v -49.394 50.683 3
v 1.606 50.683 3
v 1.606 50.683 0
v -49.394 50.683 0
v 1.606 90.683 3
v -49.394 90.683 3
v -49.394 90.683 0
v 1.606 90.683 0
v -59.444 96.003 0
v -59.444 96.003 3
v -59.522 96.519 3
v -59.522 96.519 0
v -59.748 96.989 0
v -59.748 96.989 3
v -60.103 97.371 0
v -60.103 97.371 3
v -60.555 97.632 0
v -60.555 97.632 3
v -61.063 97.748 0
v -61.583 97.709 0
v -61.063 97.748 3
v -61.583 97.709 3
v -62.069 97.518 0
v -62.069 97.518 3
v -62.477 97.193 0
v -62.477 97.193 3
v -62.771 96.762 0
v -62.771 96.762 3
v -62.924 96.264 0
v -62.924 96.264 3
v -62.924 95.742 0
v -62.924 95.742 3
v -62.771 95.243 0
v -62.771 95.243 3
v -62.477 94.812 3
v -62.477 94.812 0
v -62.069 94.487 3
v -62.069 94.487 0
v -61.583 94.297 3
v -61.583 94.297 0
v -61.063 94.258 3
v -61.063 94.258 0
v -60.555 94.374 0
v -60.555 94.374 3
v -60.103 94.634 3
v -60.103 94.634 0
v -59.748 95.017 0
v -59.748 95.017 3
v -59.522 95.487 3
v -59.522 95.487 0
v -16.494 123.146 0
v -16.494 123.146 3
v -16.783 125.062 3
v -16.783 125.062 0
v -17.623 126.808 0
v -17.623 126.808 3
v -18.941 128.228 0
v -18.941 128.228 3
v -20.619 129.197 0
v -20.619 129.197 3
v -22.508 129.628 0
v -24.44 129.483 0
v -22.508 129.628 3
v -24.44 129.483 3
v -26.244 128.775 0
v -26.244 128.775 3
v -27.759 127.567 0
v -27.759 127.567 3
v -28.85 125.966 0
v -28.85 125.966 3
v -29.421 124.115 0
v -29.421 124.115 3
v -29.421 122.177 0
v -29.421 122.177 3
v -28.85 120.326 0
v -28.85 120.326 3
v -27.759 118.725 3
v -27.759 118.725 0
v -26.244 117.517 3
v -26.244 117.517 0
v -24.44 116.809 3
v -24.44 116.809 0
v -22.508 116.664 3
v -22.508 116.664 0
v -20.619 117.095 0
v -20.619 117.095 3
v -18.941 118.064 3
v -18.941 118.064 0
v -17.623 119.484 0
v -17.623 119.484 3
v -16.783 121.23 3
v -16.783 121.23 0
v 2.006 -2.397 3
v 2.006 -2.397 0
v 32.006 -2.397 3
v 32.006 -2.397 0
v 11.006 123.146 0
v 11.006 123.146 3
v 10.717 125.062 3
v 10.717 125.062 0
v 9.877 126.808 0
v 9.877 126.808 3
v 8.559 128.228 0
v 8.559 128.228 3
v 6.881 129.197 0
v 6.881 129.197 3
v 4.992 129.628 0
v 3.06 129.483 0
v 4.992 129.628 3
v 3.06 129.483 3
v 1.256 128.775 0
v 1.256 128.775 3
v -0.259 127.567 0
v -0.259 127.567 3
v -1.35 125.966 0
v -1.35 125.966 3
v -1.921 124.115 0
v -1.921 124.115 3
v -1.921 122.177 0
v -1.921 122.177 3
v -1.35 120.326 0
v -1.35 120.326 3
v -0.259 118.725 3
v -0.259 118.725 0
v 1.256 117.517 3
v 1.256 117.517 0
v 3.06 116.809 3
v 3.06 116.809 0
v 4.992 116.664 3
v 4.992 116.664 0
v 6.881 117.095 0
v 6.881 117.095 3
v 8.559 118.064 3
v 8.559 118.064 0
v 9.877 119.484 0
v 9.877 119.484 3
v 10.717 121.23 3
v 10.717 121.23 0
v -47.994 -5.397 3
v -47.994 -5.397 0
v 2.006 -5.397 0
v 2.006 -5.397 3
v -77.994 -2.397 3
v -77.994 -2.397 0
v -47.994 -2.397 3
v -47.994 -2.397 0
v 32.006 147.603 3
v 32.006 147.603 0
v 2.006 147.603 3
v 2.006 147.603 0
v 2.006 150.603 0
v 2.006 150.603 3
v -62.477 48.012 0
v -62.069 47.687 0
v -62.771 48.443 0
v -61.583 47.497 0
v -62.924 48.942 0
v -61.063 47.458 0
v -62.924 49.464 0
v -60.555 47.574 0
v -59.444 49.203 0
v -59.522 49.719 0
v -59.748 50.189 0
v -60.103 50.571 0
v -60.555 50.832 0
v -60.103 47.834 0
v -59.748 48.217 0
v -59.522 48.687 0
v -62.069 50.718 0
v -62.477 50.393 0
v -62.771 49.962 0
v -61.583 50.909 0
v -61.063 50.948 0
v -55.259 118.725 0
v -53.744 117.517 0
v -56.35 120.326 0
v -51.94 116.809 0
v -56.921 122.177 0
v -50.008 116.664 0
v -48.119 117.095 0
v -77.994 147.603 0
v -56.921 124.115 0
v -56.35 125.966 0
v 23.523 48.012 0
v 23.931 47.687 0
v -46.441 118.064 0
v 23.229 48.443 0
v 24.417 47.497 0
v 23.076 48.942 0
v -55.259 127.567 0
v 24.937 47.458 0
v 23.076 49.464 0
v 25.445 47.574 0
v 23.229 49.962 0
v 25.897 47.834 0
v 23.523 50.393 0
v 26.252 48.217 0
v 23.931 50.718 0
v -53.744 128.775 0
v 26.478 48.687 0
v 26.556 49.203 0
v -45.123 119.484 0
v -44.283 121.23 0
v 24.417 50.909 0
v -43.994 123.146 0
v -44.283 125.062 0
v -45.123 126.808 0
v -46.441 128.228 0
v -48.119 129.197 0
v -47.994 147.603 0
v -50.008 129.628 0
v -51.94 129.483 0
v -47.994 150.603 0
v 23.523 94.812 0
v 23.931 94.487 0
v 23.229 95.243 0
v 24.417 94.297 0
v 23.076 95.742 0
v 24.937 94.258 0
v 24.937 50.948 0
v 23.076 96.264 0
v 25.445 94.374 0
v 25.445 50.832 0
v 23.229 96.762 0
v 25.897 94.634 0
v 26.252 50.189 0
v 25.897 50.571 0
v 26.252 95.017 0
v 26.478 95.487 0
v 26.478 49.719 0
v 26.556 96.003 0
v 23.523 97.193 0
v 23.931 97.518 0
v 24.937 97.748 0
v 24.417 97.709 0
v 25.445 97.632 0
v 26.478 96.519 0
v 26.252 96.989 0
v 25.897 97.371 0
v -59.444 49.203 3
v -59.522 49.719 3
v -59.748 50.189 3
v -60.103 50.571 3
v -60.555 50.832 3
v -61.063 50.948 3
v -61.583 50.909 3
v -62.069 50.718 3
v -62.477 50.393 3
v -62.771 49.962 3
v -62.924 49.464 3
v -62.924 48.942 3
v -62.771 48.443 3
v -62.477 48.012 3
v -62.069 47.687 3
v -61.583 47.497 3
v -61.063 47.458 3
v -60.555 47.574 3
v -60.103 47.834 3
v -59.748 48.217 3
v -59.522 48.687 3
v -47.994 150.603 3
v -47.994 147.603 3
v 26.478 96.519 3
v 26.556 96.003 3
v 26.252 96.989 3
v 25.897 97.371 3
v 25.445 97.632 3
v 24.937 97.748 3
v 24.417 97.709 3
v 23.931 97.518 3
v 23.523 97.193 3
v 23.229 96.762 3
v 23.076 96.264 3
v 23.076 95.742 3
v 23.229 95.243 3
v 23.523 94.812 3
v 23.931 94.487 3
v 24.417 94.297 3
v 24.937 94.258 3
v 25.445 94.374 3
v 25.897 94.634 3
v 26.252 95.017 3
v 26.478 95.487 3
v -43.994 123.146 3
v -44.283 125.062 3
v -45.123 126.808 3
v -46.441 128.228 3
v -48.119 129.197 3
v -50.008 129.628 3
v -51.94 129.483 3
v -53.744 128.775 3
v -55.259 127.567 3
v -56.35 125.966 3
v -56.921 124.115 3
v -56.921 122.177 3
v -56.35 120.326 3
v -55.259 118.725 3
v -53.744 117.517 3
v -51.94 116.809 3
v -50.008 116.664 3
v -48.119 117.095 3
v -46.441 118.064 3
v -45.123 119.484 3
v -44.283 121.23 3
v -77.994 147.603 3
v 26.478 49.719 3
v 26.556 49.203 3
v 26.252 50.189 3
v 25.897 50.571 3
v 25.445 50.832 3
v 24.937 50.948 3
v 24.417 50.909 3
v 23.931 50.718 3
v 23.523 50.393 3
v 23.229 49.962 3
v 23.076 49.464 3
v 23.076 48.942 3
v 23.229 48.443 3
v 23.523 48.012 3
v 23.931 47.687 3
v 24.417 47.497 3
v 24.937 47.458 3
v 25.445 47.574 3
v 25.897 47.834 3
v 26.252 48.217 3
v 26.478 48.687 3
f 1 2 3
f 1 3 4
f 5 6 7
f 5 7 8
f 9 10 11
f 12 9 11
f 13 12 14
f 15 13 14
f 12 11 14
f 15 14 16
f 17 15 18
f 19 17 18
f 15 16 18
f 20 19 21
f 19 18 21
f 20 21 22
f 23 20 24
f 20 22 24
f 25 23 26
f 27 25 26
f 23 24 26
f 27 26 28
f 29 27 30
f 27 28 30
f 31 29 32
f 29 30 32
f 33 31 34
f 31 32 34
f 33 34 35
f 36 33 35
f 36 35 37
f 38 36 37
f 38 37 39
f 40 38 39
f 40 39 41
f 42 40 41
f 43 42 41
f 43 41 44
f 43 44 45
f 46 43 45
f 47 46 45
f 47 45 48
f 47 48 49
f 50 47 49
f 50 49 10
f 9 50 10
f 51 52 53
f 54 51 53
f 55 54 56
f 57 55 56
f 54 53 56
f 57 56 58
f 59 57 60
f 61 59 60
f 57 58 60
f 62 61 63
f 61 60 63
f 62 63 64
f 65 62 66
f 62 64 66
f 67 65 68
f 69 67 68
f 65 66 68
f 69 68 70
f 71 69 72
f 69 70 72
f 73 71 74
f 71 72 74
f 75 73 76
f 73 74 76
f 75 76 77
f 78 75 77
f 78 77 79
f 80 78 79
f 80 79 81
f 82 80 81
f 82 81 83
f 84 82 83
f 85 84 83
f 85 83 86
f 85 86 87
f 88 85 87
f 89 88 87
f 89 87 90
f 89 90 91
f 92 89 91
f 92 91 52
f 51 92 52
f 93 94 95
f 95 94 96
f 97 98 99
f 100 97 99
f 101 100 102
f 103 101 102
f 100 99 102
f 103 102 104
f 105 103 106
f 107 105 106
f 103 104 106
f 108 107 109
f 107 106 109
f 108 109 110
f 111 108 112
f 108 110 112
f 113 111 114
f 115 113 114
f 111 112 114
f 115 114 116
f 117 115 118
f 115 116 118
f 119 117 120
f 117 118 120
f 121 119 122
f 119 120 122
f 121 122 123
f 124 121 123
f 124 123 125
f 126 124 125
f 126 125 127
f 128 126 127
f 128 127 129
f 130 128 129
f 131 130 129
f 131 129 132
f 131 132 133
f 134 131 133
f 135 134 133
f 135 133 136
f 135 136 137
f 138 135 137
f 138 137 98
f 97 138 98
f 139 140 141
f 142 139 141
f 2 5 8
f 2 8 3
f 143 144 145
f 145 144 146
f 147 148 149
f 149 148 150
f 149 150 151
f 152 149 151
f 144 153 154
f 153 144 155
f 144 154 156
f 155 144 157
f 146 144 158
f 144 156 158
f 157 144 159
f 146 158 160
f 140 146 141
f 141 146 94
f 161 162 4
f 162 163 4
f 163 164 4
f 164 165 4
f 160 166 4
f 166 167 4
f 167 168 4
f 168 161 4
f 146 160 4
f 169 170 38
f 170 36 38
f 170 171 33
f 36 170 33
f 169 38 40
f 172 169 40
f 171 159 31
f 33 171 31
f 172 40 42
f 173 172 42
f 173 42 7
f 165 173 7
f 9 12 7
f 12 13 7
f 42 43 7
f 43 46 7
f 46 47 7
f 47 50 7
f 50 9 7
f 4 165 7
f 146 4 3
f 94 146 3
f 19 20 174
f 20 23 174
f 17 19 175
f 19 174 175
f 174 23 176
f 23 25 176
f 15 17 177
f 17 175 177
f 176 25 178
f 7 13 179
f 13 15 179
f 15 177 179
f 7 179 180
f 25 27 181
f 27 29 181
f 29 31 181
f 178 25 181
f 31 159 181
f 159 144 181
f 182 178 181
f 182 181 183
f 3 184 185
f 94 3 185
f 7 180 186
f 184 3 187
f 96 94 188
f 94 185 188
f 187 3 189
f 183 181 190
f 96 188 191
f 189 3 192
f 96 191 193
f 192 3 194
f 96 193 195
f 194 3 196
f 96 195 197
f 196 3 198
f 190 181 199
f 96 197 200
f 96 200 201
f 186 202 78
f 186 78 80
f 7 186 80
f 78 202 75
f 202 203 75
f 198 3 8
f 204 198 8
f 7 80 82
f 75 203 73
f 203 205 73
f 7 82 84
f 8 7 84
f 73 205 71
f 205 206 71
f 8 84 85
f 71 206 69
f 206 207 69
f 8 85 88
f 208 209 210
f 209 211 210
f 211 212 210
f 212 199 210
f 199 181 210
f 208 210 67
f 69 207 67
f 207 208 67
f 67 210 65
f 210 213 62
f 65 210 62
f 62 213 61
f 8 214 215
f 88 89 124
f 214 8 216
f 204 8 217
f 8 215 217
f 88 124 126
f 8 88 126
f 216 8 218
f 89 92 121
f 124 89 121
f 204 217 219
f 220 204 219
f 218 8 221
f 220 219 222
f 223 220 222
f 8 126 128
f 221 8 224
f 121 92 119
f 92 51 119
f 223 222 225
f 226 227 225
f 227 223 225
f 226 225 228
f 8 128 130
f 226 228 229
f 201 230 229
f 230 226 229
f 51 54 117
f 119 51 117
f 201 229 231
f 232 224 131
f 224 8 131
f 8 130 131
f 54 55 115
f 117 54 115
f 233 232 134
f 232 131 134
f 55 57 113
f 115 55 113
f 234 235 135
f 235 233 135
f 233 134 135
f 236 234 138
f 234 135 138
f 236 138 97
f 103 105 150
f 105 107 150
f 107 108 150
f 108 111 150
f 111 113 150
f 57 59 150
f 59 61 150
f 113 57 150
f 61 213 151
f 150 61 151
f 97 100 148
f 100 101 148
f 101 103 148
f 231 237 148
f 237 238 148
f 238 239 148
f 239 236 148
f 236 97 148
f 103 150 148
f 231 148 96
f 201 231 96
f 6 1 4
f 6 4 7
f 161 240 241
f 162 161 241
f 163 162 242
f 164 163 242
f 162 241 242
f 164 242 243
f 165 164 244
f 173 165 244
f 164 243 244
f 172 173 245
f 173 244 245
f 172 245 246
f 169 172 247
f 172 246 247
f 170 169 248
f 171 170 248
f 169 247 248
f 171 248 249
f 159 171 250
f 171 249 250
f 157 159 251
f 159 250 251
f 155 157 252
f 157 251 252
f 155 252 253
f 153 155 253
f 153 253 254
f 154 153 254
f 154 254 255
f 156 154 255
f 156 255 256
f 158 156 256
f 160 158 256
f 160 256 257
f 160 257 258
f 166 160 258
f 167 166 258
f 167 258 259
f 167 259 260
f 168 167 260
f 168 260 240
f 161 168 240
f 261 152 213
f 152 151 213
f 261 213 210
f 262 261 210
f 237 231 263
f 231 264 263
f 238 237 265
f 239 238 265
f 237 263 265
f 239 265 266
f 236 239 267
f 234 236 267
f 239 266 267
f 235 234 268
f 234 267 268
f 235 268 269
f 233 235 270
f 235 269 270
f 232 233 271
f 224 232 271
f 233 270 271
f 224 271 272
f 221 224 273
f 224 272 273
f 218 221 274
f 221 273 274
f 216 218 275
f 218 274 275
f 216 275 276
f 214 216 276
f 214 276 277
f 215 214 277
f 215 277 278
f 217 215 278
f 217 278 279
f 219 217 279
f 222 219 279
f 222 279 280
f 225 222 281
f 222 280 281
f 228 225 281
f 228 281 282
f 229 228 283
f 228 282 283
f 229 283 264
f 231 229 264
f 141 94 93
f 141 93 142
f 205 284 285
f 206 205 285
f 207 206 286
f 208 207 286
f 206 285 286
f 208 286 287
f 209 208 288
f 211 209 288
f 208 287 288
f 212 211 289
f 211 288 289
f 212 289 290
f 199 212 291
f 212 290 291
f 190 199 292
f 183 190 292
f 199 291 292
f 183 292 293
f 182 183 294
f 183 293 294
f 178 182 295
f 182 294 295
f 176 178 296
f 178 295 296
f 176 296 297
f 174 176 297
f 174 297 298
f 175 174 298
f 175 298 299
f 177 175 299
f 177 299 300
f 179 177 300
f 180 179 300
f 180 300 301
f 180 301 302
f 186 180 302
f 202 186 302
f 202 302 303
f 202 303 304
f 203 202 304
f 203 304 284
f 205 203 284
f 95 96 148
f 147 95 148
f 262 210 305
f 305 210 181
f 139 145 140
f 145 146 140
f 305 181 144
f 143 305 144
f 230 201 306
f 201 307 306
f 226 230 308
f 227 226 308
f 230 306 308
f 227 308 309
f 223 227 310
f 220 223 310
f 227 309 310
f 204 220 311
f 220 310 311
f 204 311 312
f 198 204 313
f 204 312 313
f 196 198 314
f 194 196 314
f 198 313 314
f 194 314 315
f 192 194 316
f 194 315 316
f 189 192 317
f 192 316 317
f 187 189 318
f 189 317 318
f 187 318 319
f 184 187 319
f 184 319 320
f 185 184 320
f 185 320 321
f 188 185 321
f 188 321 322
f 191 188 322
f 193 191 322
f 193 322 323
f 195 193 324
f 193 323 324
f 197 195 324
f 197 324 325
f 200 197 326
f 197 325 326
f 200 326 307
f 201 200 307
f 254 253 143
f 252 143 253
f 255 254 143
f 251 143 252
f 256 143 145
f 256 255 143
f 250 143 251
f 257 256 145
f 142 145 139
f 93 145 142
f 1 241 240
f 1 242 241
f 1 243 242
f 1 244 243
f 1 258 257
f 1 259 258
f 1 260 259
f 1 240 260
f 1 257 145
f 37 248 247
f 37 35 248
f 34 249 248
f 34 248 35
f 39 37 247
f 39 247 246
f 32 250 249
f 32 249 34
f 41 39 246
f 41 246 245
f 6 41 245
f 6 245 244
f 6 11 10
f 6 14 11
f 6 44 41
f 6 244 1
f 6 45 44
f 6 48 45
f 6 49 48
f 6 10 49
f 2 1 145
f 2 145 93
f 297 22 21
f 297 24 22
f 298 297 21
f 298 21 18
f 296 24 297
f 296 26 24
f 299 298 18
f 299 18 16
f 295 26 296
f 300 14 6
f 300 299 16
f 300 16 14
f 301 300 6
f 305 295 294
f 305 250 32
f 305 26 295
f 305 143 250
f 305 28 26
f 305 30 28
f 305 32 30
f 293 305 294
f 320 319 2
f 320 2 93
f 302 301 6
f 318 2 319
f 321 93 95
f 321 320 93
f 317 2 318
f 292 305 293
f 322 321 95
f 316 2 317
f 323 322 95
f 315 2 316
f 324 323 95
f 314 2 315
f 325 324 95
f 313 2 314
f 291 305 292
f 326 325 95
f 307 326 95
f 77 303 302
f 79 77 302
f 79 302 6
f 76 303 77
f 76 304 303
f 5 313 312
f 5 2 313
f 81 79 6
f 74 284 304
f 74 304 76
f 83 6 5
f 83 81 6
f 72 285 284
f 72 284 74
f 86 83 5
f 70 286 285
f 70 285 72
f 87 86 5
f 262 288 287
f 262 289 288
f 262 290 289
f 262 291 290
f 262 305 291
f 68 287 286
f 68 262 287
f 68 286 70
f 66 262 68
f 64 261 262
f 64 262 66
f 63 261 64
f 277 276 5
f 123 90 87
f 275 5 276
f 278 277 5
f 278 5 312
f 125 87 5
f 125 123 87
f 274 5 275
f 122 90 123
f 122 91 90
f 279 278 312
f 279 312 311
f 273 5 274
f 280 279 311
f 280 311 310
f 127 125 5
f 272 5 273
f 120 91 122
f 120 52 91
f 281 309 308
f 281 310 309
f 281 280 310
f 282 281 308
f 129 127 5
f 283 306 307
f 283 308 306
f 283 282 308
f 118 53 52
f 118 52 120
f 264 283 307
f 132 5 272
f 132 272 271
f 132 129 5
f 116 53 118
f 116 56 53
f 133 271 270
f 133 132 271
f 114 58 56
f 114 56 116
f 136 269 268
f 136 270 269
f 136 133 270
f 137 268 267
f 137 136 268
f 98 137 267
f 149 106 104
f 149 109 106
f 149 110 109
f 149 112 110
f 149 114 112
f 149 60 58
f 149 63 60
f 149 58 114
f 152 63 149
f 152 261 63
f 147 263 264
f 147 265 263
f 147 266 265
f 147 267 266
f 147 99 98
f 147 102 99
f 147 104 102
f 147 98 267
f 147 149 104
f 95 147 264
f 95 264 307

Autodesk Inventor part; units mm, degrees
ref_plane "YZ Plane" through (0, 0, 0) normal (1, 0, 0) x (0, 1, 0)
ref_plane "XZ Plane" through (0, 0, 0) normal (0, 1, 0) x (-1, 0, 0)
ref_plane "XY Plane" through (0, 0, 0) normal (0, 0, 1) x (1, 0, 0)
sketch "Sketch1" plane through (0, 0, 0) normal (0, 0, 1) x (1, 0, 0)
  line L0 (-77.994, -2.3973) -> (-47.994, -2.3973)
  line L1 (-47.994, -2.3973) -> (-47.994, -5.3973)
  line L2 (-47.994, -5.3973) -> (2.006, -5.3973)
  line L3 (2.006, -2.3973) -> (32.006, -2.3973)
  line L4 (32.006, -2.3973) -> (32.006, 147.6027)
  line L5 (32.006, 147.6027) -> (2.006, 147.6027)
  line L6 (2.006, 147.6027) -> (2.006, 150.6027)
  line L7 (2.006, 150.6027) -> (-47.994, 150.6027)
  line L8 (-47.994, 150.6027) -> (-47.994, 147.6027)
  line L9 (-47.994, 147.6027) -> (-77.994, 147.6027)
  line L10 (2.006, -2.3973) -> (2.006, -5.3973)
  line L11 (-77.994, 147.6027) -> (-77.994, -2.3973)
  point P0 (0, 0)
  dimension "d0" = 150
  dimension "d1" = 3
  dimension "d2" = 3
  dimension "d3" = 50
  dimension "d4" = 50
  dimension "d5" = 30
  dimension "d6" = 30
extrude "Extrusion1" add sketch "Sketch1" along normal blind 3
sketch "Sketch2" plane through (0, 0, 3) normal (0, 0, 1) x (1, 0, 0)
  line L0 (27.506, 96.0027) -> (27.506, 98.7027)
  line L1 (-77.994, 147.6027) -> (-77.994, -2.3973) projected
  circle A0 centre (24.806, 49.2027) radius 1.75
  circle A1 centre (24.806, 96.0027) radius 1.75
  circle A2 centre (-61.194, 96.0027) radius 1.75
  circle A3 centre (-61.194, 49.2027) radius 1.75
  line L2 (27.506, 50.6827) -> (27.506, 46.5027)
  line L3 (1.606, 50.6827) -> (-49.394, 50.6827)
  line L4 (-49.394, 50.6827) -> (-49.394, 90.6827)
  line L5 (-49.394, 90.6827) -> (1.606, 90.6827)
  line L6 (1.606, 90.6827) -> (1.606, 50.6827)
  line L7 (32.006, 147.6027) -> (2.006, 147.6027) projected
  point P0 (0, 0)
extrude "Extrusion2" cut sketch "Sketch2" against normal blind 3
sketch "Sketch3" plane through (0, 0, 3) normal (0, 0, 1) x (1, 0, 0)
  circle A0 centre (-61.194, 49.2027) radius 1.75 projected
  point P0 (0, 0)
sketch "Sketch4" plane through (0, 0, 3) normal (0, 0, 1) x (1, 0, 0)
  circle A0 centre (-61.194, 96.0027) radius 1.75 projected
  line L0 (-77.994, 147.6027) -> (-77.994, -2.3973) projected
  circle A1 centre (-50.494, 123.146) radius 6.5
  circle A2 centre (-22.994, 123.146) radius 6.5
  circle A3 centre (4.506, 123.146) radius 6.5
  point P0 (0, 0)
  point P1 (32.006, 147.6027)
  dimension "d48" = 13
  dimension "d49" = 13
  dimension "d50" = 13
extrude "Extrusion3" cut sketch "Sketch4" against normal blind 3 contours A1 | A2 | A3
properties part number "test"
